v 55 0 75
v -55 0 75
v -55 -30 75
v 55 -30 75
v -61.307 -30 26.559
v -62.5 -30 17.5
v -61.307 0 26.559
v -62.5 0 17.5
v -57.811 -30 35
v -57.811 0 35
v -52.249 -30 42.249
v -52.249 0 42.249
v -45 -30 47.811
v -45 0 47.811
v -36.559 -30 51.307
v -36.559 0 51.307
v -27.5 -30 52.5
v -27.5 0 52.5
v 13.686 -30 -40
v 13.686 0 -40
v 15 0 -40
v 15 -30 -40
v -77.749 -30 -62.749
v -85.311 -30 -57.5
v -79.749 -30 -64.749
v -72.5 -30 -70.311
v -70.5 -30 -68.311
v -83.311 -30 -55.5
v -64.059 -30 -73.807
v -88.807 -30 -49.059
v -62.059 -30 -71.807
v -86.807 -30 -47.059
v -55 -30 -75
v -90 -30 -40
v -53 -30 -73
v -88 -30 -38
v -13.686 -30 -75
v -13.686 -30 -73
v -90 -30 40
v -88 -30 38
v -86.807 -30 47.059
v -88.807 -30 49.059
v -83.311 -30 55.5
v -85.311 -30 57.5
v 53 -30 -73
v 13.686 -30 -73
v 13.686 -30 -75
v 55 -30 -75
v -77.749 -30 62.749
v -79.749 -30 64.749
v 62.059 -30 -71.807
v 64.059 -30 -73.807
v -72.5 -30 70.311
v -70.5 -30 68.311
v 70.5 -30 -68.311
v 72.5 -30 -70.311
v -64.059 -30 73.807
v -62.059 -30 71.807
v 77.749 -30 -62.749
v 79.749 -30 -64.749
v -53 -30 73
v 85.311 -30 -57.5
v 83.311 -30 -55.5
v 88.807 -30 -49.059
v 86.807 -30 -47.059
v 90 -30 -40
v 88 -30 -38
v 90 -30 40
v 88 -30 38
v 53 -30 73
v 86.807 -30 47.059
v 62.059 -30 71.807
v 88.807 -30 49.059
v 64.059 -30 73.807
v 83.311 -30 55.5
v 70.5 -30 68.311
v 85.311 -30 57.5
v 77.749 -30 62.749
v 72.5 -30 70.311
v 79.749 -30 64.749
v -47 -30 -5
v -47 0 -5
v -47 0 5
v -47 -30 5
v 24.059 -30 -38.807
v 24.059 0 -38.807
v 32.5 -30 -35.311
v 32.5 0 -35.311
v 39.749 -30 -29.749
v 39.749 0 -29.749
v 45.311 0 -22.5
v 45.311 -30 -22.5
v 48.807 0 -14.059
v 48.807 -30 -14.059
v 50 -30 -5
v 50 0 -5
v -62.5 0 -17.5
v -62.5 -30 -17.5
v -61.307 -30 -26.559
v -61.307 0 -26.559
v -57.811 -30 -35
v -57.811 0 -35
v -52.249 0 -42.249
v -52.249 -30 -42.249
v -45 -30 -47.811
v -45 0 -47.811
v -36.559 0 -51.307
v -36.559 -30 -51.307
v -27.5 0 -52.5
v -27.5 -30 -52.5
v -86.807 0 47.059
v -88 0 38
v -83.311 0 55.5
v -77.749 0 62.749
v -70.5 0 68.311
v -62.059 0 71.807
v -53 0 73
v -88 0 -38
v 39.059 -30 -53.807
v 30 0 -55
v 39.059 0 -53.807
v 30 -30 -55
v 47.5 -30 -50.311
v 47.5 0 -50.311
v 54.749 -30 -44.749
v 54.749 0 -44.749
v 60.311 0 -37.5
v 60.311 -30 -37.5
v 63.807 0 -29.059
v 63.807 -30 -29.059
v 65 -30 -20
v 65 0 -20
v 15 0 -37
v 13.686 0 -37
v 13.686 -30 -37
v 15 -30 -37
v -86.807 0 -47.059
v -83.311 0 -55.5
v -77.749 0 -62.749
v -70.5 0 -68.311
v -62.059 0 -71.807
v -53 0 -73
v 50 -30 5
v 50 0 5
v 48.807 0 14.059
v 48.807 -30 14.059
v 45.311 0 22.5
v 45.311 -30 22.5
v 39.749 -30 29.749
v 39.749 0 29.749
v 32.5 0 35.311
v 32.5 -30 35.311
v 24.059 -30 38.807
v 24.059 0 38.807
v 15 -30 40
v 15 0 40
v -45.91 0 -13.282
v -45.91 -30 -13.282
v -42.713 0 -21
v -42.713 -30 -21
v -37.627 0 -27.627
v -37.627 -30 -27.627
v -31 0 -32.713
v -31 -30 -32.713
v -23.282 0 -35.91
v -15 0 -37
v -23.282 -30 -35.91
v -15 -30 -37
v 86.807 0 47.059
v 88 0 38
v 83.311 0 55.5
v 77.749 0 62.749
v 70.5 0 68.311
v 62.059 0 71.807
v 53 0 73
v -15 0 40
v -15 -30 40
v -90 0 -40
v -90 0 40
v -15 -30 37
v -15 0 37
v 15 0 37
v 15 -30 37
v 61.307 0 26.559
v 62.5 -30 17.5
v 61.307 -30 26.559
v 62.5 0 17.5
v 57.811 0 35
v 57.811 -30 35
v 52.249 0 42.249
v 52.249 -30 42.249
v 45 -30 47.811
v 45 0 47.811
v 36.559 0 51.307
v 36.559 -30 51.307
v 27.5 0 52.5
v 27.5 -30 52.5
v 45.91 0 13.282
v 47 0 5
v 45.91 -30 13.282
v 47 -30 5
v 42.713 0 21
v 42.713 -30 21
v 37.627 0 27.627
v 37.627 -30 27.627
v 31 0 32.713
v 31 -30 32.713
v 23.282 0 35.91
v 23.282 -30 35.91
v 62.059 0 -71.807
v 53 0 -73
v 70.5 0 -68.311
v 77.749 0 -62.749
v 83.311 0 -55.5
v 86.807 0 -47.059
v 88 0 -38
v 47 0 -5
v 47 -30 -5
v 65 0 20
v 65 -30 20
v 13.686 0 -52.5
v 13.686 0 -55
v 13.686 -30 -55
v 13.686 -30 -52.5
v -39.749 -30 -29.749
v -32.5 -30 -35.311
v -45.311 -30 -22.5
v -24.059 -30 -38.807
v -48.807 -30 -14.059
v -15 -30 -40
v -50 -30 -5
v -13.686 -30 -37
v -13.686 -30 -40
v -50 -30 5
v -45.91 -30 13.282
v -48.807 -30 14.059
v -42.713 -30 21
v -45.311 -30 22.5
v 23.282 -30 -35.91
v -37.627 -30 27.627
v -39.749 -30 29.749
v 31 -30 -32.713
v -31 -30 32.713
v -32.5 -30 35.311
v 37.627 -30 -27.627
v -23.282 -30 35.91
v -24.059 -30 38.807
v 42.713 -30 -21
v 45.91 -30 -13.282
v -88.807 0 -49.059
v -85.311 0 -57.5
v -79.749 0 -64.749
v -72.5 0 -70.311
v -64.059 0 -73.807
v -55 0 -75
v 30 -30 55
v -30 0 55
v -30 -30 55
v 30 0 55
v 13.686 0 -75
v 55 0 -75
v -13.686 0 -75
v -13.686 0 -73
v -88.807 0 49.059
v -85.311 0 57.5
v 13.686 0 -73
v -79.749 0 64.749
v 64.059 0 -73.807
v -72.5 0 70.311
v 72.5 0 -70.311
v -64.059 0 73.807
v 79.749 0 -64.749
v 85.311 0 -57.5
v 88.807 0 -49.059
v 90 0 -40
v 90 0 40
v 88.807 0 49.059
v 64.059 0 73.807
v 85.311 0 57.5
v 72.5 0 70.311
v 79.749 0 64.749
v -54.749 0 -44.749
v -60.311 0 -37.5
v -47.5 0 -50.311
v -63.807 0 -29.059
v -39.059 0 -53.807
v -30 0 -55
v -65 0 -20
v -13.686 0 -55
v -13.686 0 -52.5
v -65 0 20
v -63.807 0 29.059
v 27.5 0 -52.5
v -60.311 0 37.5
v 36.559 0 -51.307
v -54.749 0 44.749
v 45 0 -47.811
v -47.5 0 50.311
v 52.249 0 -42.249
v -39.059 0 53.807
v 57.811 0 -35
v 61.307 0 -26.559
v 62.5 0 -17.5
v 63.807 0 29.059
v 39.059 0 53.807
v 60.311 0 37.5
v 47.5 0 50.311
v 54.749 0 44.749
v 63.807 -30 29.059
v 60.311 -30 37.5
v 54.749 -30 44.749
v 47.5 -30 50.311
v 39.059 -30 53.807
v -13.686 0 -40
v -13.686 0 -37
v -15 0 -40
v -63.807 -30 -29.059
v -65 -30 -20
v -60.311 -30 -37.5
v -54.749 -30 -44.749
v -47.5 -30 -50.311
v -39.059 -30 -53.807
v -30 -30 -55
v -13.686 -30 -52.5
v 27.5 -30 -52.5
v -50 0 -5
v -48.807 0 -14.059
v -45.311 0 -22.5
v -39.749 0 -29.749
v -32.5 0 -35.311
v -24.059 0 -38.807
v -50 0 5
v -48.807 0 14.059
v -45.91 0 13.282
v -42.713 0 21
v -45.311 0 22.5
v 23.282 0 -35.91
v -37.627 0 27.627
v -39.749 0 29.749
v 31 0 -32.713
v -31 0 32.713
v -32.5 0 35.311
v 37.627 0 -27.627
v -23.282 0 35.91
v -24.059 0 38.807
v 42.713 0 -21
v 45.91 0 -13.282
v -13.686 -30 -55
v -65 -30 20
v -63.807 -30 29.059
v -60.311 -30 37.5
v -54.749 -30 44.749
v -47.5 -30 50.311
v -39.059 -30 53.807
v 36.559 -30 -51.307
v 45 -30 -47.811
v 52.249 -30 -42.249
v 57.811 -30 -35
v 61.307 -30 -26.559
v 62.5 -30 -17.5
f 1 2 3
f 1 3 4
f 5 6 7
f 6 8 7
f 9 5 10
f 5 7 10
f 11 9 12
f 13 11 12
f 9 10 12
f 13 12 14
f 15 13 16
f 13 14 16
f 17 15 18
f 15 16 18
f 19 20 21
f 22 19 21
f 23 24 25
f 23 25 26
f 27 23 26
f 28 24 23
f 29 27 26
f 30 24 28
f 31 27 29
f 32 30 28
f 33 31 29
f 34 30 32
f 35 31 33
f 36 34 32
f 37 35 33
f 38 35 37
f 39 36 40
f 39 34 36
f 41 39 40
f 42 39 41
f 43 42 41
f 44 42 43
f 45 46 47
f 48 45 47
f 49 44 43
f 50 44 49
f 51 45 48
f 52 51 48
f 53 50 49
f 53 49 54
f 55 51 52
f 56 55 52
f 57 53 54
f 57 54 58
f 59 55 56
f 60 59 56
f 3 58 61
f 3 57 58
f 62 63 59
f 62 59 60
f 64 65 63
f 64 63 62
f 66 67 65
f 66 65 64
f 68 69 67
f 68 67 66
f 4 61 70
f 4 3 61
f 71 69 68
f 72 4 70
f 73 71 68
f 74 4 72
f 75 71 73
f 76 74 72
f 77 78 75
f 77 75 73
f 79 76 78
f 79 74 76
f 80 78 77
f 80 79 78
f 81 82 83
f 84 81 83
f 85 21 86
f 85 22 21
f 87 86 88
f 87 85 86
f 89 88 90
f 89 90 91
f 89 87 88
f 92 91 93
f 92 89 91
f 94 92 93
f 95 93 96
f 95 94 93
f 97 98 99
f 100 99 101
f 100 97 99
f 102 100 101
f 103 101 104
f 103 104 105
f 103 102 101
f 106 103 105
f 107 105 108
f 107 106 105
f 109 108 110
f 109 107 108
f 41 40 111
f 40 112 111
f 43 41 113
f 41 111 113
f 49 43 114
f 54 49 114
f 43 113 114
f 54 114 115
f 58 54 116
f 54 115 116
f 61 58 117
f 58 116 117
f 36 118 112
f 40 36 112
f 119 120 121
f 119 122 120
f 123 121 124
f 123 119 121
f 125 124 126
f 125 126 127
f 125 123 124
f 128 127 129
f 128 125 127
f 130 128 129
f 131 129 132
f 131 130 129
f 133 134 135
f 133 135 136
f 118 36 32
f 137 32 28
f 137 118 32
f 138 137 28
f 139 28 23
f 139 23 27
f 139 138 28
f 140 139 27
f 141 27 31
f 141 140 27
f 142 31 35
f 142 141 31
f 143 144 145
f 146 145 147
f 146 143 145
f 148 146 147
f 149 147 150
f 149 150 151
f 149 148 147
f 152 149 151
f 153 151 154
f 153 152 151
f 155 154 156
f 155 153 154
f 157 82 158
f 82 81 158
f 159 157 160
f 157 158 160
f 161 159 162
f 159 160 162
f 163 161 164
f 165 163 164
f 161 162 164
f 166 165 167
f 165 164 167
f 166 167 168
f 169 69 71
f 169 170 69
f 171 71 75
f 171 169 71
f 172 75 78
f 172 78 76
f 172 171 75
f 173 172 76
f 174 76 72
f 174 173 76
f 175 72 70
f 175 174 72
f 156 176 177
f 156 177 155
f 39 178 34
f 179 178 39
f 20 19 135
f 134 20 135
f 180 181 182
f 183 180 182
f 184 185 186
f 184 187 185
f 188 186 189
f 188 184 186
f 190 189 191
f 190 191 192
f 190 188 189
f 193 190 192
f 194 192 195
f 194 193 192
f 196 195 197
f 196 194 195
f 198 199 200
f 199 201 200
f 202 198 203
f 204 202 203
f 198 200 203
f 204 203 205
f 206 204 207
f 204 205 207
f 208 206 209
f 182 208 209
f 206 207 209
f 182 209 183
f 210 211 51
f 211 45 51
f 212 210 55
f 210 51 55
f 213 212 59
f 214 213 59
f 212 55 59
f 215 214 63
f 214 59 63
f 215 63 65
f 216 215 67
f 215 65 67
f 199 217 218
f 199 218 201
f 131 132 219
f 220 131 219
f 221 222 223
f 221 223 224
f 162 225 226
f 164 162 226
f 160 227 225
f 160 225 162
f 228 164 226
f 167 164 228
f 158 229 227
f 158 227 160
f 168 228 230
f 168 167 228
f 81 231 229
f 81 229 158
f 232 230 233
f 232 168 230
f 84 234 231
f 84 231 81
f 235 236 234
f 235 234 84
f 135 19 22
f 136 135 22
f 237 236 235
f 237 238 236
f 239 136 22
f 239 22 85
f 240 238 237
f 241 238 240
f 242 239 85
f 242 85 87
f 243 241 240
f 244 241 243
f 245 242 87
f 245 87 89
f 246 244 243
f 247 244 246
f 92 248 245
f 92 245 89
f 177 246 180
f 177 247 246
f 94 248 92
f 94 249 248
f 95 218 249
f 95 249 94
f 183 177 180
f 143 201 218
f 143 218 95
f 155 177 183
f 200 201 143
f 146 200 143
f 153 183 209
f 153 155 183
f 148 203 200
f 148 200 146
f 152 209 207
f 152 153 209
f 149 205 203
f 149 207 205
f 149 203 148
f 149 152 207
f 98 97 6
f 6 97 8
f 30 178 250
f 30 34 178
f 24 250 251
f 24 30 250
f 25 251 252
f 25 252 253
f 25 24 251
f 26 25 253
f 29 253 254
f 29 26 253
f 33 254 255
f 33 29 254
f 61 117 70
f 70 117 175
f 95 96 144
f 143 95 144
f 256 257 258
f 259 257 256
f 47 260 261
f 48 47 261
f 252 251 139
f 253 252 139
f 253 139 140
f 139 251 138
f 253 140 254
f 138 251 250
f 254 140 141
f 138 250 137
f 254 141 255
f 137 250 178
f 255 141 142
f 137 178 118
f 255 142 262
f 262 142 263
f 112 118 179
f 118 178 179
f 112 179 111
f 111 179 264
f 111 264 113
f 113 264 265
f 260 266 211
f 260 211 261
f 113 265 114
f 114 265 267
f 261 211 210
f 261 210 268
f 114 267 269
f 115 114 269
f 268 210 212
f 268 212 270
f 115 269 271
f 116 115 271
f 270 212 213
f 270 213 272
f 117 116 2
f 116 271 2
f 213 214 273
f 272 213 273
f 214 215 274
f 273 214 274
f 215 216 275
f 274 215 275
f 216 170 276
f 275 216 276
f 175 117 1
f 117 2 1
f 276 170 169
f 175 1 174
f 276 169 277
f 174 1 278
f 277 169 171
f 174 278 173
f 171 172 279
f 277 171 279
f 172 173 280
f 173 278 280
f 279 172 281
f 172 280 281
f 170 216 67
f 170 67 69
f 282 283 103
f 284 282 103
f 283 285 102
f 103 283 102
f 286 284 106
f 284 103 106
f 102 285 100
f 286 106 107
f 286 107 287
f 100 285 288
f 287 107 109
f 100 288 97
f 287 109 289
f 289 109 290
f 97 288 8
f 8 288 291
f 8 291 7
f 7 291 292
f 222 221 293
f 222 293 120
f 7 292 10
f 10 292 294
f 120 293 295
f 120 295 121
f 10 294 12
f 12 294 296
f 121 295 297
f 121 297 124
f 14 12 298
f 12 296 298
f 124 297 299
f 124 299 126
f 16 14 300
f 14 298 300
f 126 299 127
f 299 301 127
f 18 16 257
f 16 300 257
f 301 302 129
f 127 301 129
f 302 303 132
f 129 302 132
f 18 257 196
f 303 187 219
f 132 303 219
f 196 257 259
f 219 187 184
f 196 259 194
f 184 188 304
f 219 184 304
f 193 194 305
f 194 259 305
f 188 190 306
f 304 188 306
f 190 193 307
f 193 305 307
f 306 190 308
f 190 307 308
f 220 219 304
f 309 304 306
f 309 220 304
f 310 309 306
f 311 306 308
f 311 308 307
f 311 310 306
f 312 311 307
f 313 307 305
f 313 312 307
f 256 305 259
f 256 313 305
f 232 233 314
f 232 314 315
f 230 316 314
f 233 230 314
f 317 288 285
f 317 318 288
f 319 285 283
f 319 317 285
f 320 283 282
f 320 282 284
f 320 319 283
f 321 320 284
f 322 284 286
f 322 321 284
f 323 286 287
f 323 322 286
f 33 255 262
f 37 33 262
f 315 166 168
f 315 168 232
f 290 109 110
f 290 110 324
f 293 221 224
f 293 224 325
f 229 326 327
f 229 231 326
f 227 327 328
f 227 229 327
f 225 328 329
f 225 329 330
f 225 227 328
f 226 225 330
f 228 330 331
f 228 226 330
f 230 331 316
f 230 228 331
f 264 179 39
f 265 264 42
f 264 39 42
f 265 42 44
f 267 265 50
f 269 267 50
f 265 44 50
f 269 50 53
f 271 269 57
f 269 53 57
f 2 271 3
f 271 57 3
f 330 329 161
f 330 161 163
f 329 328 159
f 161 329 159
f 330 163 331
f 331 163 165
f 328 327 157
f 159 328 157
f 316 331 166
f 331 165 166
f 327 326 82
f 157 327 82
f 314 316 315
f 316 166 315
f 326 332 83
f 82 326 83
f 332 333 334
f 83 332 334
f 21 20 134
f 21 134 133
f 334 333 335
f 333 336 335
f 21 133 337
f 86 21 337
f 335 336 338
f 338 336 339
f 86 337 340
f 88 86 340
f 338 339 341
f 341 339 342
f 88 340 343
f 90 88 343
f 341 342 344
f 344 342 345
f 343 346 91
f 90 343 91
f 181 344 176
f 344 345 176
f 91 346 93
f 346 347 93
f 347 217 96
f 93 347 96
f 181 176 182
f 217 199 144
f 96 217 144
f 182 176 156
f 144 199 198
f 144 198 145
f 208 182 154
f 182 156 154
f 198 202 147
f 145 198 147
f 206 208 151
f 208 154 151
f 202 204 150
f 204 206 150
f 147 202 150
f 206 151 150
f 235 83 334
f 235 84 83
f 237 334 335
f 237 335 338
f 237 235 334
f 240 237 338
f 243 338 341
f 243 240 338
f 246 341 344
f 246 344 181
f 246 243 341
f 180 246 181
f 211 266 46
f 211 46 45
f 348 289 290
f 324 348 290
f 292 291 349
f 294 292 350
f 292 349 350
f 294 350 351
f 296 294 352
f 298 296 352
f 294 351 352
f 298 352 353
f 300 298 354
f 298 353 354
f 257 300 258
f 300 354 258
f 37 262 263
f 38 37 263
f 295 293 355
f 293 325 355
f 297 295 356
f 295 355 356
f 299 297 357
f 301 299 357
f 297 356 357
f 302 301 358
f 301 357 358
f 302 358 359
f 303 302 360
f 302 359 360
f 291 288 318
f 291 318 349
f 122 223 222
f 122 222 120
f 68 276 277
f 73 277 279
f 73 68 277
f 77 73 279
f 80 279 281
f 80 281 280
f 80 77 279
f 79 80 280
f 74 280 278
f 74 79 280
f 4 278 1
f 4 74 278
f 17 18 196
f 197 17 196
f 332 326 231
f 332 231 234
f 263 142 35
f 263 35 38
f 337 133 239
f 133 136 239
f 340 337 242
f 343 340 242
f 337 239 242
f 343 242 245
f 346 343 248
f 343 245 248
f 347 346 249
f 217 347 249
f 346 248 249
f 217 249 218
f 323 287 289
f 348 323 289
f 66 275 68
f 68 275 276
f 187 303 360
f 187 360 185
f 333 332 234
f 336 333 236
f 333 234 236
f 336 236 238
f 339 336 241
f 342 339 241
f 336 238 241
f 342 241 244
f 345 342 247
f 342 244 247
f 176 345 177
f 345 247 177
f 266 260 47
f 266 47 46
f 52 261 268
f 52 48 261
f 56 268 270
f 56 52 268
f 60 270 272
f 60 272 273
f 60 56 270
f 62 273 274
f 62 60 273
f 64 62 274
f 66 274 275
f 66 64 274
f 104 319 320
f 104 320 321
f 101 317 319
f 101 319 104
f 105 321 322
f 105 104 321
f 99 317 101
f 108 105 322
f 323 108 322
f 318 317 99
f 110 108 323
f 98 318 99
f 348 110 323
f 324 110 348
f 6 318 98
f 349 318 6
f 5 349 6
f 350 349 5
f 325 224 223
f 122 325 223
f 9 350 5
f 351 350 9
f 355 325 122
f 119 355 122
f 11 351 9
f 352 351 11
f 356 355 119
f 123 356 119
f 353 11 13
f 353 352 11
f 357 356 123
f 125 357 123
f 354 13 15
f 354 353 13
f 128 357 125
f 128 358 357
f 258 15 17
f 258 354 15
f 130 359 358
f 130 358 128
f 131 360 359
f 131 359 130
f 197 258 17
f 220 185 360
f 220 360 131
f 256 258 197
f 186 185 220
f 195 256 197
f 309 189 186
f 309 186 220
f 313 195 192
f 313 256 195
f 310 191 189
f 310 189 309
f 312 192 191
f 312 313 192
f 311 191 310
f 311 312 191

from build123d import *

# Parameters (mm, degrees)
F0_W      = 180
F0_H      = 150
F1_DEPTH  = 30
F2_T      = -2
F3_W      = 130
F3_H      = 110
F4_DEPTH  = 30
F5_T      = -2.5
F6_W      = 100
F6_H      = 80
F7_DEPTH  = 30
F8_R      = 35
F8_2_R    = 35
F8_3_R    = 35
F9_T      = -3
F10_W     = 27.3726535961
F10_H     = 91.242223978
F11_DEPTH = 30.001


with BuildPart() as f1:
    # F0 (on Front) → F1 (new body)
    with BuildSketch(Plane.XZ):
        Rectangle(F0_W, F0_H)
    extrude(amount=F1_DEPTH)

    # F2
    f2_openings = [f1.faces().sort_by_distance(p)[0] for p in [
        (0, -30, 0),
        (0, 0, 0),
    ]]
    offset(amount=F2_T, openings=f2_openings)

    # F8
    f8_edges = [f1.edges().sort_by_distance(p)[0] for p in [
        (-88, -15, 73),
        (-90, -15, 75),
        (90, -15, 75),
        (88, -15, 73),
        (88, -15, -73),
        (90, -15, -75),
        (-88, -15, -73),
        (-90, -15, -75),
    ]]
    fillet(f8_edges, radius=F8_R)


with BuildPart() as f4:
    # F3 (on face) → F4 (new body)
    with BuildSketch(Plane.XZ):
        Rectangle(F3_W, F3_H)
    extrude(amount=F4_DEPTH)

    # F5
    f5_openings = [f4.faces().sort_by_distance(p)[0] for p in [
        (0, -30, 0),
        (0, 0, 0),
    ]]
    offset(amount=F5_T, openings=f5_openings)

    # F8#2
    f8_2_edges = [f4.edges().sort_by_distance(p)[0] for p in [
        (-62.5, -15, 52.5),
        (-65, -15, 55),
        (-62.5, -15, -52.5),
        (-65, -15, -55),
        (62.5, -15, -52.5),
        (62.5, -15, 52.5),
        (65, -15, -55),
        (65, -15, 55),
    ]]
    fillet(f8_2_edges, radius=F8_2_R)


with BuildPart() as f7:
    # F6 (on face) → F7 (new body)
    with BuildSketch(Plane.XZ):
        Rectangle(F6_W, F6_H)
    extrude(amount=F7_DEPTH)

    # F8#3
    f8_3_edges = [f7.edges().sort_by_distance(p)[0] for p in [
        (50, -15, 40),
        (-50, -15, 40),
        (-50, -15, -40),
        (50, -15, -40),
    ]]
    fillet(f8_3_edges, radius=F8_3_R)

    # F9
    f9_openings = [f7.faces().sort_by_distance(p)[0] for p in [
        (0, -30, 0),
        (0, 0, 0),
    ]]
    offset(amount=F9_T, openings=f9_openings)


with BuildPart() as f11_tool:
    # F10 (on face) → F11 (new body, through all)
    with BuildSketch(Plane.XZ):
        with Locations((1.72295e-05, -79.0765881538)):
            Rectangle(F10_W, F10_H)
    extrude(amount=F11_DEPTH)


with BuildPart() as f1_1:
    add(f1.part)

    # F11: cut by f11_tool
    add(f11_tool.part, mode=Mode.SUBTRACT)


with BuildPart() as f4_1:
    add(f4.part)

    # F11: cut by f11_tool
    add(f11_tool.part, mode=Mode.SUBTRACT)


with BuildPart() as f7_1:
    add(f7.part)

    # F11: cut by f11_tool
    add(f11_tool.part, mode=Mode.SUBTRACT)


solid = Compound([f1_1.part, f4_1.part, f7_1.part])
